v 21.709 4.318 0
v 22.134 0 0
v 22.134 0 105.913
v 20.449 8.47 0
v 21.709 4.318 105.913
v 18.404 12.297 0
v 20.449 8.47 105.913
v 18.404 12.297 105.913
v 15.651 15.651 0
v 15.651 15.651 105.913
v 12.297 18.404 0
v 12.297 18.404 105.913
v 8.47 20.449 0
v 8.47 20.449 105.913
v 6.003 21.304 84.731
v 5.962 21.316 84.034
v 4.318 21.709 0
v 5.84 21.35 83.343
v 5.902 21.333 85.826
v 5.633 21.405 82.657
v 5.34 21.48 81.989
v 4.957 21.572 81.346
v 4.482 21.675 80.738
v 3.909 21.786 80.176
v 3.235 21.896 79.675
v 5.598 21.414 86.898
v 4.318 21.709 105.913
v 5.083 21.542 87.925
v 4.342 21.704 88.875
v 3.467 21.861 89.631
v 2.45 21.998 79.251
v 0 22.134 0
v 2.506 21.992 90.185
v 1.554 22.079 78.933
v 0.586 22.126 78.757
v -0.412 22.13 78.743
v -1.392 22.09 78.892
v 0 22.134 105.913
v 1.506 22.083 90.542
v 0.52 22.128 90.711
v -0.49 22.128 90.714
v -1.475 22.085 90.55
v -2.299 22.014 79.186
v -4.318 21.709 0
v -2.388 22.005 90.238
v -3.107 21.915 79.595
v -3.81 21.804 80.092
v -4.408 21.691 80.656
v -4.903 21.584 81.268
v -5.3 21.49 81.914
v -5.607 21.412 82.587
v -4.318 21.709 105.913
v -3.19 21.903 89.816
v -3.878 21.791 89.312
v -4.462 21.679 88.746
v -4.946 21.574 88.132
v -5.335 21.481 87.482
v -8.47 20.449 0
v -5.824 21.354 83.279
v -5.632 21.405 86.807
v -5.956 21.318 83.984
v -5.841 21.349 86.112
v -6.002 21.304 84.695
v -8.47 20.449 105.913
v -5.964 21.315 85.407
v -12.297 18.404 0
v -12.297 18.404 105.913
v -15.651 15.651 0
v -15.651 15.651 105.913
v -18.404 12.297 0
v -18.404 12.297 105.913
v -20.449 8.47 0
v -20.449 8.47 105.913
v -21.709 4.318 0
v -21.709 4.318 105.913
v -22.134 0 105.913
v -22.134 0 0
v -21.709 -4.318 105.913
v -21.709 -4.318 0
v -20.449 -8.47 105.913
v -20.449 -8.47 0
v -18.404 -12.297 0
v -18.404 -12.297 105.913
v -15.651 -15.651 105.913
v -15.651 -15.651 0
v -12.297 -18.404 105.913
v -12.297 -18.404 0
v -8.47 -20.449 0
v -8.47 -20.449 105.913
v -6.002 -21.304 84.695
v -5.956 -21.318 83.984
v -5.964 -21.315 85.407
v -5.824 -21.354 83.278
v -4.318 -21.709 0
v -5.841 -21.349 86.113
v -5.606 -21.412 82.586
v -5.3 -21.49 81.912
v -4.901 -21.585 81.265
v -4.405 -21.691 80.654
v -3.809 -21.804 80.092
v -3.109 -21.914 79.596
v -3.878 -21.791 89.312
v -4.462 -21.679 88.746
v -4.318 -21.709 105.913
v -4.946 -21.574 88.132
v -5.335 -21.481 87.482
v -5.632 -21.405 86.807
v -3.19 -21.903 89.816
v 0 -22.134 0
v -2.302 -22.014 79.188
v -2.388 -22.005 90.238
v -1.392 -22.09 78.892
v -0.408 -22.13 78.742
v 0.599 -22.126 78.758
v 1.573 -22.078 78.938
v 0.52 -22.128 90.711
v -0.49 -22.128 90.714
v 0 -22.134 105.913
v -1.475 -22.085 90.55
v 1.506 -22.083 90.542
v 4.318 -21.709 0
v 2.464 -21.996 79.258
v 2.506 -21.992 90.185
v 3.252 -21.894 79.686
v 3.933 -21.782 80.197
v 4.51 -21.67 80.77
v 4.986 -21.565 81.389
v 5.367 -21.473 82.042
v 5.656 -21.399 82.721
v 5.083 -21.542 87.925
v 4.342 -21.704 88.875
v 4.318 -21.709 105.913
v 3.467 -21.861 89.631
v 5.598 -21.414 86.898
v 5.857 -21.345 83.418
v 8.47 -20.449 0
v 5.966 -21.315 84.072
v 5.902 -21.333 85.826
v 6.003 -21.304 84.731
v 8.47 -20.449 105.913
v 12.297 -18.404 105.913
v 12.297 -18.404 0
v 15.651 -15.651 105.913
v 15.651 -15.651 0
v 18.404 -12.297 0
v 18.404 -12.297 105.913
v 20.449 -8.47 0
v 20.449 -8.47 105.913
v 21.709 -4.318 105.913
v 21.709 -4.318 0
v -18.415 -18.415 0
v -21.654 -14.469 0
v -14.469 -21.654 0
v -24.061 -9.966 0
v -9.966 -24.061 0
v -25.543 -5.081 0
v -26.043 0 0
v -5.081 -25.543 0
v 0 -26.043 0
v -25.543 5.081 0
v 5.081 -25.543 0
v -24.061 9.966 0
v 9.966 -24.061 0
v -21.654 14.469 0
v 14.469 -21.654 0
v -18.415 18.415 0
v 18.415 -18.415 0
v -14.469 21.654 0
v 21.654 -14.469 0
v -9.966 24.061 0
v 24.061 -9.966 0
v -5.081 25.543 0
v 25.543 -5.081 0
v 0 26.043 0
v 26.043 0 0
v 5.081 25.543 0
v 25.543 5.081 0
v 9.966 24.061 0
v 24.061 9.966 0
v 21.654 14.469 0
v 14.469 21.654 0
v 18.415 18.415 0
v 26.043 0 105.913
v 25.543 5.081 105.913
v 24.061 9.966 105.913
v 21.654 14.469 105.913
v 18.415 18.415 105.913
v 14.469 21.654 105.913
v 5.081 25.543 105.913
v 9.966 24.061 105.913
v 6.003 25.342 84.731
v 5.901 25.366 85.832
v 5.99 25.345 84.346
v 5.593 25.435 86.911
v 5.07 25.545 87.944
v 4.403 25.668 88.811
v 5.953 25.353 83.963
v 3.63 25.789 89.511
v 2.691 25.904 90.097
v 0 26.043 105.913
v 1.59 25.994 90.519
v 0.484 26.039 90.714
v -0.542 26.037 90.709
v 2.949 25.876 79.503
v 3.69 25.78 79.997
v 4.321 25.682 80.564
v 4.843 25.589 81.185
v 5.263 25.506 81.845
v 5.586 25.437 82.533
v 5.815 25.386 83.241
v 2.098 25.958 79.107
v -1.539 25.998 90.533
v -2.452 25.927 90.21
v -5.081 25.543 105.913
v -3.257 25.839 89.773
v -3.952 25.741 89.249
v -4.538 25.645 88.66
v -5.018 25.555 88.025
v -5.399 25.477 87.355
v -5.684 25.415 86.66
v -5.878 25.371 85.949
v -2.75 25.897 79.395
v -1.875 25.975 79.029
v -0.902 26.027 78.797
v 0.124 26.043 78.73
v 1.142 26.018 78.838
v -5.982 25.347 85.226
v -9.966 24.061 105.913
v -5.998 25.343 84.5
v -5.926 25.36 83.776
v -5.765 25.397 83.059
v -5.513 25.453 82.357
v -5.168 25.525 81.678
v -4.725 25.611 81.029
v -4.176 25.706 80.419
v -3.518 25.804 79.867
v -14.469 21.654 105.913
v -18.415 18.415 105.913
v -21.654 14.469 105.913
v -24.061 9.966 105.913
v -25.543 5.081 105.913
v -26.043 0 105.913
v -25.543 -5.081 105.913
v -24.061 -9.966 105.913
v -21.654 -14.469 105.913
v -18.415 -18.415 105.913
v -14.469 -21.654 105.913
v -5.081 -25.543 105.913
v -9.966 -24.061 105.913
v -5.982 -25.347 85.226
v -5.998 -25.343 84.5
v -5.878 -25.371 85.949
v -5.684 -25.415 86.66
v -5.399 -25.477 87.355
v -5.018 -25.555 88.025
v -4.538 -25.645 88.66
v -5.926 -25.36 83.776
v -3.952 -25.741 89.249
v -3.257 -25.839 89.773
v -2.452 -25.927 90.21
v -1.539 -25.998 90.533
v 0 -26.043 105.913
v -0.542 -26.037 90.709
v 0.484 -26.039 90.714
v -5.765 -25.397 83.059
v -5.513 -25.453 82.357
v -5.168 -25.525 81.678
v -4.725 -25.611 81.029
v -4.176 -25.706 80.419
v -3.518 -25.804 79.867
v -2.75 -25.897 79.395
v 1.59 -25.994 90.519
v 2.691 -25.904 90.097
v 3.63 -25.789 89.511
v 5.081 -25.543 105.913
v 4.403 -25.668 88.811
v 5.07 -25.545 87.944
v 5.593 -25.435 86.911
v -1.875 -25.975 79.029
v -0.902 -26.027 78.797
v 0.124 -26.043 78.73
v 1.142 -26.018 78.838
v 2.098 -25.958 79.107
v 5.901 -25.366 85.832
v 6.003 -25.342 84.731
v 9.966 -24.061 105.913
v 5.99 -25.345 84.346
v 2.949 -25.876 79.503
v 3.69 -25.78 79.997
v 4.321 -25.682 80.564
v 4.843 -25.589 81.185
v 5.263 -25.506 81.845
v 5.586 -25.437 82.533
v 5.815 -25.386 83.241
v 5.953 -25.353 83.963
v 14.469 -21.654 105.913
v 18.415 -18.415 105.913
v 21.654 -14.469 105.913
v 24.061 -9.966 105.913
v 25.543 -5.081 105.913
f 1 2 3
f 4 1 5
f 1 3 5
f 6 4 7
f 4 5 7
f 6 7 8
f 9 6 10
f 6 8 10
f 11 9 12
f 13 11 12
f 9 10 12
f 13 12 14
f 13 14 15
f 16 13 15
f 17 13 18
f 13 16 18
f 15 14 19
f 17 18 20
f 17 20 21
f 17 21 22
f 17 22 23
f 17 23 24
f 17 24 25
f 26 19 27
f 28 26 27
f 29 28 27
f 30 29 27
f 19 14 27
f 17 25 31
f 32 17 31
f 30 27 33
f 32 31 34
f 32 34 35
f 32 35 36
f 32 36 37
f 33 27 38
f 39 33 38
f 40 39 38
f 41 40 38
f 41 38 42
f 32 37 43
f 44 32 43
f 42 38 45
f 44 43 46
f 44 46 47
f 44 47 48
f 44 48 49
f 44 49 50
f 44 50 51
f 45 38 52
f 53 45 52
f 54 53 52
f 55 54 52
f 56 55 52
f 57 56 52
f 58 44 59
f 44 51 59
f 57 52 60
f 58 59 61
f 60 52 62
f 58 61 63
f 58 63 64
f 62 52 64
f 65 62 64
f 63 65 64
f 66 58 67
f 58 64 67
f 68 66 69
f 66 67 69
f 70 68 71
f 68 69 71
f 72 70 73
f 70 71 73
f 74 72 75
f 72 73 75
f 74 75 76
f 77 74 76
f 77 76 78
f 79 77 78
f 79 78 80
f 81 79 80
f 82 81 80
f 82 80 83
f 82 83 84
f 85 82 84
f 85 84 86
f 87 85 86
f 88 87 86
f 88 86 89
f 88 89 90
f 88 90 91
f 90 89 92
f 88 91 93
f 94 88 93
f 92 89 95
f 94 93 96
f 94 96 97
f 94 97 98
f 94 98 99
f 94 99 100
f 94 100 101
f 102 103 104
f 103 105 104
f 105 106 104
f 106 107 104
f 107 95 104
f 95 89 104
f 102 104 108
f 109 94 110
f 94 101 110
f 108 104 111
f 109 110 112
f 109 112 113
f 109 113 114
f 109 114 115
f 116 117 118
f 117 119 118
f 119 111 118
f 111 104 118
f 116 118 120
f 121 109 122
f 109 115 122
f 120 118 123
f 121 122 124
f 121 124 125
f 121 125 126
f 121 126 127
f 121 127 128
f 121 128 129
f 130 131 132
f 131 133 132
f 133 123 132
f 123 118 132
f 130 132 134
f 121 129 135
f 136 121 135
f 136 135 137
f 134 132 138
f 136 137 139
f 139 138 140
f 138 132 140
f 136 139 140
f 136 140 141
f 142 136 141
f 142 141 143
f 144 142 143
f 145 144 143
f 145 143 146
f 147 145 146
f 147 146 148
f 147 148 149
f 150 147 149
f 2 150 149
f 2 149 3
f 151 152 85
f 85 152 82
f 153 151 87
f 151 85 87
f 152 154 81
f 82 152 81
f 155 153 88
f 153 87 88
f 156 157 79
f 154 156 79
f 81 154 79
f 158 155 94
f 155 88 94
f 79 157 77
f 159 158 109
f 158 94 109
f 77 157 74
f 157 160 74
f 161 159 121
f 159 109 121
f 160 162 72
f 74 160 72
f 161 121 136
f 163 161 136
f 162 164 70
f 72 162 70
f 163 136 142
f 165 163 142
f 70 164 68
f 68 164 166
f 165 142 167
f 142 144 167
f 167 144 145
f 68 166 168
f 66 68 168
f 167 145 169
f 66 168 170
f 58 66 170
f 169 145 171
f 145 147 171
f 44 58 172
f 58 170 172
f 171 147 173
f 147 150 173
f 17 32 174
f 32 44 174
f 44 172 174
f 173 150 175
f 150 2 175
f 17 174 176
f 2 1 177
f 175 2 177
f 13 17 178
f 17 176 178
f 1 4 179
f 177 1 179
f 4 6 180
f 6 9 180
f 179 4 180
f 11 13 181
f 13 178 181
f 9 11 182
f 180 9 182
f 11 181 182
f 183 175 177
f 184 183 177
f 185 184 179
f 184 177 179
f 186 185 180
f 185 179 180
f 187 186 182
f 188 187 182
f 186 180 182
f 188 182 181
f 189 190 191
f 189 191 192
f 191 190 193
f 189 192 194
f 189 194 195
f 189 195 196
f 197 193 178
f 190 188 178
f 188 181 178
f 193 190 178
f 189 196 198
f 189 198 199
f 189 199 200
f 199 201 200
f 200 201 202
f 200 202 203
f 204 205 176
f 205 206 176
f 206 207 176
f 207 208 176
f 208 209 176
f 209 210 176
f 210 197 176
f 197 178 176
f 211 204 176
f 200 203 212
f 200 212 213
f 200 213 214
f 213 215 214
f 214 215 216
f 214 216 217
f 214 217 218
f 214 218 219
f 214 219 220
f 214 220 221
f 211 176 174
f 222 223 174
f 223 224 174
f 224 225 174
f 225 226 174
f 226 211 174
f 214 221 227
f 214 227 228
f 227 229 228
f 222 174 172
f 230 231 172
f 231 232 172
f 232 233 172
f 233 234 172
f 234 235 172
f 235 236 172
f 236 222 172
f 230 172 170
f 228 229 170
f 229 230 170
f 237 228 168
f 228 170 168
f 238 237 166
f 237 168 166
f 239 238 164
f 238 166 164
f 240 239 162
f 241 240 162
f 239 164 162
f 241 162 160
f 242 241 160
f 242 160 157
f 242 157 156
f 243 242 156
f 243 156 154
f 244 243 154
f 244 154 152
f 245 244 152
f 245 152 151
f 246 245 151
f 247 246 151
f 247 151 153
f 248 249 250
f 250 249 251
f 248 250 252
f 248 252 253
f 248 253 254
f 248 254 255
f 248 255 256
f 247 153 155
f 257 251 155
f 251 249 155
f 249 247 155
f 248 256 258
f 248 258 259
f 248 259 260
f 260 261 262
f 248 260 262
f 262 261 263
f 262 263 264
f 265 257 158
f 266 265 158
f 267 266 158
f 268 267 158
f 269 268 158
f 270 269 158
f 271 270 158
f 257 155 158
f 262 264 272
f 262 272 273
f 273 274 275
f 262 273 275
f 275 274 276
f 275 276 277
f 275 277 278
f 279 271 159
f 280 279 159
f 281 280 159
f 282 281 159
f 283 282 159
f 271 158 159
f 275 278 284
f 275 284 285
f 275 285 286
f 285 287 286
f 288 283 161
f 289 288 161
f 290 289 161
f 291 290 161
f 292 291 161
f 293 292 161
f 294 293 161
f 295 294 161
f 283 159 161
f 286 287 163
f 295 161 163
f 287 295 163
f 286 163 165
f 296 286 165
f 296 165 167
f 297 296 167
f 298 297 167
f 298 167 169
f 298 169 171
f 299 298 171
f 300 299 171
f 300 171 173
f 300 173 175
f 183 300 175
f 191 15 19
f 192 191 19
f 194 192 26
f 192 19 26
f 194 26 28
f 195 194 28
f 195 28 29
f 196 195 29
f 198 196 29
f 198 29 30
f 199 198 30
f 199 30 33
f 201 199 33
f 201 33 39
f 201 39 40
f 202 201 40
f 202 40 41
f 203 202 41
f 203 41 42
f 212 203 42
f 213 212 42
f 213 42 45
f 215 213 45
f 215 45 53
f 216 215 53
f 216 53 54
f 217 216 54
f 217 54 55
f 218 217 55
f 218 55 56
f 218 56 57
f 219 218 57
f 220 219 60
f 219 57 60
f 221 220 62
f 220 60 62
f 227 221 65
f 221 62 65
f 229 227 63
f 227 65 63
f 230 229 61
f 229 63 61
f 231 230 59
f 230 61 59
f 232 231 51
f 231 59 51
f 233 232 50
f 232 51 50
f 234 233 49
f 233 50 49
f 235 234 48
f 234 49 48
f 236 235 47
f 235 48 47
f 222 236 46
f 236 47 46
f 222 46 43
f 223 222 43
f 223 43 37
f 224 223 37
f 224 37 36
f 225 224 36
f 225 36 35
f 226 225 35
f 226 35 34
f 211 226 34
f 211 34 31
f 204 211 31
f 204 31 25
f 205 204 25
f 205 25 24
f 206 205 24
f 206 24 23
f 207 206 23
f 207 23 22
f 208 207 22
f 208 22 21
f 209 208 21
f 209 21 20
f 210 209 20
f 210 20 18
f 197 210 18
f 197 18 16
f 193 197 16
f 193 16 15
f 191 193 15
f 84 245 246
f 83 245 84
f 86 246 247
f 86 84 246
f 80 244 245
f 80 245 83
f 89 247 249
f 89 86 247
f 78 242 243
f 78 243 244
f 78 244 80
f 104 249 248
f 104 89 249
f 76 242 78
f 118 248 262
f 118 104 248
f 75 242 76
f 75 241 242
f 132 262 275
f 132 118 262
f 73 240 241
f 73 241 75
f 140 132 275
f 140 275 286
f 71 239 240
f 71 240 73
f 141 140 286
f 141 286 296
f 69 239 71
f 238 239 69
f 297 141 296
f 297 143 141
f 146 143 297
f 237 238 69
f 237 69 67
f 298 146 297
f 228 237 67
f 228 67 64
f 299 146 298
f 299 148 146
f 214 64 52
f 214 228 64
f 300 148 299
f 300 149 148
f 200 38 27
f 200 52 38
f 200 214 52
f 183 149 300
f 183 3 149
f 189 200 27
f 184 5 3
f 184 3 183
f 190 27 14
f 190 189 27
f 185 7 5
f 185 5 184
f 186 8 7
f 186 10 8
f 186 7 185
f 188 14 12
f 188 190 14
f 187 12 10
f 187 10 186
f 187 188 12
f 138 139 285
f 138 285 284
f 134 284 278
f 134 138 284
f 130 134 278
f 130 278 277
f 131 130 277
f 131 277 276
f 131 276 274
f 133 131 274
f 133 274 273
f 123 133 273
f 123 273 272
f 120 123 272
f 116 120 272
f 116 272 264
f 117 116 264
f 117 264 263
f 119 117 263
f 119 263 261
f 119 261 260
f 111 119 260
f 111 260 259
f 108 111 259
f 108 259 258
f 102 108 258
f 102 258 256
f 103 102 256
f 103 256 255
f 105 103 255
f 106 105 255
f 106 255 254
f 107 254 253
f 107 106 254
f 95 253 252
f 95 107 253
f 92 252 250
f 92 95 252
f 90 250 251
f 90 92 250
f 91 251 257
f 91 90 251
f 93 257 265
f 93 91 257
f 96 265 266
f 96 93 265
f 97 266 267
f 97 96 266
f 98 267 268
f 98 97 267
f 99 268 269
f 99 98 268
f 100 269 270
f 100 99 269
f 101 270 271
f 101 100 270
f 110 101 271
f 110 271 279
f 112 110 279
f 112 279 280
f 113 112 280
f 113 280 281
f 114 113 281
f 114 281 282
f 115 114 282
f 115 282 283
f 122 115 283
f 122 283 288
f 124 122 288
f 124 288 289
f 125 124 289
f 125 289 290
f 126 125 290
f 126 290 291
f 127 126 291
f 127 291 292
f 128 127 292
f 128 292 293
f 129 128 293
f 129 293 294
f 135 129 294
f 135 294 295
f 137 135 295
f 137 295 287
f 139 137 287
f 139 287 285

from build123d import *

# Parameters (mm, degrees)
F0_R          = 26.043045
F1_DEPTH      = 105.912507
F2_R          = 26.043045
F3_R          = 22.133915
F5_DEPTH      = 88.553265
F4_R          = 22.133915
F6_DEPTH      = 185.232297
F7_R          = 6.00256
F8_DEPTH      = 38.1
F8_DEPTH_BACK = 38.1


with BuildPart() as f1:
    # F0 (on Top) → F1 (new body)
    with BuildSketch(Plane.XY):
        Circle(F0_R)
    extrude(amount=F1_DEPTH)

    # F2 (on face) + F3 (on face) → F5 (join)
    with BuildSketch(Plane.XY.offset(105.912507)):
        Circle(F2_R)
    with BuildSketch(Plane.XY.offset(105.912507)):
        Circle(F3_R)
    extrude(amount=-F5_DEPTH)

    # F4 (on face) → F6 (cut)
    with BuildSketch(Plane.XY.offset(105.912507)):
        Circle(F4_R)
    extrude(amount=-F6_DEPTH, mode=Mode.SUBTRACT)

    # F7 (on Front) → F8 (cut, two sides)
    with BuildSketch(Plane.XZ) as f8_sk:
        with Locations((0, 84.731072)):
            Circle(F7_R)
    extrude(amount=F8_DEPTH, mode=Mode.SUBTRACT)
    extrude(f8_sk.sketch, amount=-F8_DEPTH_BACK, mode=Mode.SUBTRACT)


solid = f1.part
